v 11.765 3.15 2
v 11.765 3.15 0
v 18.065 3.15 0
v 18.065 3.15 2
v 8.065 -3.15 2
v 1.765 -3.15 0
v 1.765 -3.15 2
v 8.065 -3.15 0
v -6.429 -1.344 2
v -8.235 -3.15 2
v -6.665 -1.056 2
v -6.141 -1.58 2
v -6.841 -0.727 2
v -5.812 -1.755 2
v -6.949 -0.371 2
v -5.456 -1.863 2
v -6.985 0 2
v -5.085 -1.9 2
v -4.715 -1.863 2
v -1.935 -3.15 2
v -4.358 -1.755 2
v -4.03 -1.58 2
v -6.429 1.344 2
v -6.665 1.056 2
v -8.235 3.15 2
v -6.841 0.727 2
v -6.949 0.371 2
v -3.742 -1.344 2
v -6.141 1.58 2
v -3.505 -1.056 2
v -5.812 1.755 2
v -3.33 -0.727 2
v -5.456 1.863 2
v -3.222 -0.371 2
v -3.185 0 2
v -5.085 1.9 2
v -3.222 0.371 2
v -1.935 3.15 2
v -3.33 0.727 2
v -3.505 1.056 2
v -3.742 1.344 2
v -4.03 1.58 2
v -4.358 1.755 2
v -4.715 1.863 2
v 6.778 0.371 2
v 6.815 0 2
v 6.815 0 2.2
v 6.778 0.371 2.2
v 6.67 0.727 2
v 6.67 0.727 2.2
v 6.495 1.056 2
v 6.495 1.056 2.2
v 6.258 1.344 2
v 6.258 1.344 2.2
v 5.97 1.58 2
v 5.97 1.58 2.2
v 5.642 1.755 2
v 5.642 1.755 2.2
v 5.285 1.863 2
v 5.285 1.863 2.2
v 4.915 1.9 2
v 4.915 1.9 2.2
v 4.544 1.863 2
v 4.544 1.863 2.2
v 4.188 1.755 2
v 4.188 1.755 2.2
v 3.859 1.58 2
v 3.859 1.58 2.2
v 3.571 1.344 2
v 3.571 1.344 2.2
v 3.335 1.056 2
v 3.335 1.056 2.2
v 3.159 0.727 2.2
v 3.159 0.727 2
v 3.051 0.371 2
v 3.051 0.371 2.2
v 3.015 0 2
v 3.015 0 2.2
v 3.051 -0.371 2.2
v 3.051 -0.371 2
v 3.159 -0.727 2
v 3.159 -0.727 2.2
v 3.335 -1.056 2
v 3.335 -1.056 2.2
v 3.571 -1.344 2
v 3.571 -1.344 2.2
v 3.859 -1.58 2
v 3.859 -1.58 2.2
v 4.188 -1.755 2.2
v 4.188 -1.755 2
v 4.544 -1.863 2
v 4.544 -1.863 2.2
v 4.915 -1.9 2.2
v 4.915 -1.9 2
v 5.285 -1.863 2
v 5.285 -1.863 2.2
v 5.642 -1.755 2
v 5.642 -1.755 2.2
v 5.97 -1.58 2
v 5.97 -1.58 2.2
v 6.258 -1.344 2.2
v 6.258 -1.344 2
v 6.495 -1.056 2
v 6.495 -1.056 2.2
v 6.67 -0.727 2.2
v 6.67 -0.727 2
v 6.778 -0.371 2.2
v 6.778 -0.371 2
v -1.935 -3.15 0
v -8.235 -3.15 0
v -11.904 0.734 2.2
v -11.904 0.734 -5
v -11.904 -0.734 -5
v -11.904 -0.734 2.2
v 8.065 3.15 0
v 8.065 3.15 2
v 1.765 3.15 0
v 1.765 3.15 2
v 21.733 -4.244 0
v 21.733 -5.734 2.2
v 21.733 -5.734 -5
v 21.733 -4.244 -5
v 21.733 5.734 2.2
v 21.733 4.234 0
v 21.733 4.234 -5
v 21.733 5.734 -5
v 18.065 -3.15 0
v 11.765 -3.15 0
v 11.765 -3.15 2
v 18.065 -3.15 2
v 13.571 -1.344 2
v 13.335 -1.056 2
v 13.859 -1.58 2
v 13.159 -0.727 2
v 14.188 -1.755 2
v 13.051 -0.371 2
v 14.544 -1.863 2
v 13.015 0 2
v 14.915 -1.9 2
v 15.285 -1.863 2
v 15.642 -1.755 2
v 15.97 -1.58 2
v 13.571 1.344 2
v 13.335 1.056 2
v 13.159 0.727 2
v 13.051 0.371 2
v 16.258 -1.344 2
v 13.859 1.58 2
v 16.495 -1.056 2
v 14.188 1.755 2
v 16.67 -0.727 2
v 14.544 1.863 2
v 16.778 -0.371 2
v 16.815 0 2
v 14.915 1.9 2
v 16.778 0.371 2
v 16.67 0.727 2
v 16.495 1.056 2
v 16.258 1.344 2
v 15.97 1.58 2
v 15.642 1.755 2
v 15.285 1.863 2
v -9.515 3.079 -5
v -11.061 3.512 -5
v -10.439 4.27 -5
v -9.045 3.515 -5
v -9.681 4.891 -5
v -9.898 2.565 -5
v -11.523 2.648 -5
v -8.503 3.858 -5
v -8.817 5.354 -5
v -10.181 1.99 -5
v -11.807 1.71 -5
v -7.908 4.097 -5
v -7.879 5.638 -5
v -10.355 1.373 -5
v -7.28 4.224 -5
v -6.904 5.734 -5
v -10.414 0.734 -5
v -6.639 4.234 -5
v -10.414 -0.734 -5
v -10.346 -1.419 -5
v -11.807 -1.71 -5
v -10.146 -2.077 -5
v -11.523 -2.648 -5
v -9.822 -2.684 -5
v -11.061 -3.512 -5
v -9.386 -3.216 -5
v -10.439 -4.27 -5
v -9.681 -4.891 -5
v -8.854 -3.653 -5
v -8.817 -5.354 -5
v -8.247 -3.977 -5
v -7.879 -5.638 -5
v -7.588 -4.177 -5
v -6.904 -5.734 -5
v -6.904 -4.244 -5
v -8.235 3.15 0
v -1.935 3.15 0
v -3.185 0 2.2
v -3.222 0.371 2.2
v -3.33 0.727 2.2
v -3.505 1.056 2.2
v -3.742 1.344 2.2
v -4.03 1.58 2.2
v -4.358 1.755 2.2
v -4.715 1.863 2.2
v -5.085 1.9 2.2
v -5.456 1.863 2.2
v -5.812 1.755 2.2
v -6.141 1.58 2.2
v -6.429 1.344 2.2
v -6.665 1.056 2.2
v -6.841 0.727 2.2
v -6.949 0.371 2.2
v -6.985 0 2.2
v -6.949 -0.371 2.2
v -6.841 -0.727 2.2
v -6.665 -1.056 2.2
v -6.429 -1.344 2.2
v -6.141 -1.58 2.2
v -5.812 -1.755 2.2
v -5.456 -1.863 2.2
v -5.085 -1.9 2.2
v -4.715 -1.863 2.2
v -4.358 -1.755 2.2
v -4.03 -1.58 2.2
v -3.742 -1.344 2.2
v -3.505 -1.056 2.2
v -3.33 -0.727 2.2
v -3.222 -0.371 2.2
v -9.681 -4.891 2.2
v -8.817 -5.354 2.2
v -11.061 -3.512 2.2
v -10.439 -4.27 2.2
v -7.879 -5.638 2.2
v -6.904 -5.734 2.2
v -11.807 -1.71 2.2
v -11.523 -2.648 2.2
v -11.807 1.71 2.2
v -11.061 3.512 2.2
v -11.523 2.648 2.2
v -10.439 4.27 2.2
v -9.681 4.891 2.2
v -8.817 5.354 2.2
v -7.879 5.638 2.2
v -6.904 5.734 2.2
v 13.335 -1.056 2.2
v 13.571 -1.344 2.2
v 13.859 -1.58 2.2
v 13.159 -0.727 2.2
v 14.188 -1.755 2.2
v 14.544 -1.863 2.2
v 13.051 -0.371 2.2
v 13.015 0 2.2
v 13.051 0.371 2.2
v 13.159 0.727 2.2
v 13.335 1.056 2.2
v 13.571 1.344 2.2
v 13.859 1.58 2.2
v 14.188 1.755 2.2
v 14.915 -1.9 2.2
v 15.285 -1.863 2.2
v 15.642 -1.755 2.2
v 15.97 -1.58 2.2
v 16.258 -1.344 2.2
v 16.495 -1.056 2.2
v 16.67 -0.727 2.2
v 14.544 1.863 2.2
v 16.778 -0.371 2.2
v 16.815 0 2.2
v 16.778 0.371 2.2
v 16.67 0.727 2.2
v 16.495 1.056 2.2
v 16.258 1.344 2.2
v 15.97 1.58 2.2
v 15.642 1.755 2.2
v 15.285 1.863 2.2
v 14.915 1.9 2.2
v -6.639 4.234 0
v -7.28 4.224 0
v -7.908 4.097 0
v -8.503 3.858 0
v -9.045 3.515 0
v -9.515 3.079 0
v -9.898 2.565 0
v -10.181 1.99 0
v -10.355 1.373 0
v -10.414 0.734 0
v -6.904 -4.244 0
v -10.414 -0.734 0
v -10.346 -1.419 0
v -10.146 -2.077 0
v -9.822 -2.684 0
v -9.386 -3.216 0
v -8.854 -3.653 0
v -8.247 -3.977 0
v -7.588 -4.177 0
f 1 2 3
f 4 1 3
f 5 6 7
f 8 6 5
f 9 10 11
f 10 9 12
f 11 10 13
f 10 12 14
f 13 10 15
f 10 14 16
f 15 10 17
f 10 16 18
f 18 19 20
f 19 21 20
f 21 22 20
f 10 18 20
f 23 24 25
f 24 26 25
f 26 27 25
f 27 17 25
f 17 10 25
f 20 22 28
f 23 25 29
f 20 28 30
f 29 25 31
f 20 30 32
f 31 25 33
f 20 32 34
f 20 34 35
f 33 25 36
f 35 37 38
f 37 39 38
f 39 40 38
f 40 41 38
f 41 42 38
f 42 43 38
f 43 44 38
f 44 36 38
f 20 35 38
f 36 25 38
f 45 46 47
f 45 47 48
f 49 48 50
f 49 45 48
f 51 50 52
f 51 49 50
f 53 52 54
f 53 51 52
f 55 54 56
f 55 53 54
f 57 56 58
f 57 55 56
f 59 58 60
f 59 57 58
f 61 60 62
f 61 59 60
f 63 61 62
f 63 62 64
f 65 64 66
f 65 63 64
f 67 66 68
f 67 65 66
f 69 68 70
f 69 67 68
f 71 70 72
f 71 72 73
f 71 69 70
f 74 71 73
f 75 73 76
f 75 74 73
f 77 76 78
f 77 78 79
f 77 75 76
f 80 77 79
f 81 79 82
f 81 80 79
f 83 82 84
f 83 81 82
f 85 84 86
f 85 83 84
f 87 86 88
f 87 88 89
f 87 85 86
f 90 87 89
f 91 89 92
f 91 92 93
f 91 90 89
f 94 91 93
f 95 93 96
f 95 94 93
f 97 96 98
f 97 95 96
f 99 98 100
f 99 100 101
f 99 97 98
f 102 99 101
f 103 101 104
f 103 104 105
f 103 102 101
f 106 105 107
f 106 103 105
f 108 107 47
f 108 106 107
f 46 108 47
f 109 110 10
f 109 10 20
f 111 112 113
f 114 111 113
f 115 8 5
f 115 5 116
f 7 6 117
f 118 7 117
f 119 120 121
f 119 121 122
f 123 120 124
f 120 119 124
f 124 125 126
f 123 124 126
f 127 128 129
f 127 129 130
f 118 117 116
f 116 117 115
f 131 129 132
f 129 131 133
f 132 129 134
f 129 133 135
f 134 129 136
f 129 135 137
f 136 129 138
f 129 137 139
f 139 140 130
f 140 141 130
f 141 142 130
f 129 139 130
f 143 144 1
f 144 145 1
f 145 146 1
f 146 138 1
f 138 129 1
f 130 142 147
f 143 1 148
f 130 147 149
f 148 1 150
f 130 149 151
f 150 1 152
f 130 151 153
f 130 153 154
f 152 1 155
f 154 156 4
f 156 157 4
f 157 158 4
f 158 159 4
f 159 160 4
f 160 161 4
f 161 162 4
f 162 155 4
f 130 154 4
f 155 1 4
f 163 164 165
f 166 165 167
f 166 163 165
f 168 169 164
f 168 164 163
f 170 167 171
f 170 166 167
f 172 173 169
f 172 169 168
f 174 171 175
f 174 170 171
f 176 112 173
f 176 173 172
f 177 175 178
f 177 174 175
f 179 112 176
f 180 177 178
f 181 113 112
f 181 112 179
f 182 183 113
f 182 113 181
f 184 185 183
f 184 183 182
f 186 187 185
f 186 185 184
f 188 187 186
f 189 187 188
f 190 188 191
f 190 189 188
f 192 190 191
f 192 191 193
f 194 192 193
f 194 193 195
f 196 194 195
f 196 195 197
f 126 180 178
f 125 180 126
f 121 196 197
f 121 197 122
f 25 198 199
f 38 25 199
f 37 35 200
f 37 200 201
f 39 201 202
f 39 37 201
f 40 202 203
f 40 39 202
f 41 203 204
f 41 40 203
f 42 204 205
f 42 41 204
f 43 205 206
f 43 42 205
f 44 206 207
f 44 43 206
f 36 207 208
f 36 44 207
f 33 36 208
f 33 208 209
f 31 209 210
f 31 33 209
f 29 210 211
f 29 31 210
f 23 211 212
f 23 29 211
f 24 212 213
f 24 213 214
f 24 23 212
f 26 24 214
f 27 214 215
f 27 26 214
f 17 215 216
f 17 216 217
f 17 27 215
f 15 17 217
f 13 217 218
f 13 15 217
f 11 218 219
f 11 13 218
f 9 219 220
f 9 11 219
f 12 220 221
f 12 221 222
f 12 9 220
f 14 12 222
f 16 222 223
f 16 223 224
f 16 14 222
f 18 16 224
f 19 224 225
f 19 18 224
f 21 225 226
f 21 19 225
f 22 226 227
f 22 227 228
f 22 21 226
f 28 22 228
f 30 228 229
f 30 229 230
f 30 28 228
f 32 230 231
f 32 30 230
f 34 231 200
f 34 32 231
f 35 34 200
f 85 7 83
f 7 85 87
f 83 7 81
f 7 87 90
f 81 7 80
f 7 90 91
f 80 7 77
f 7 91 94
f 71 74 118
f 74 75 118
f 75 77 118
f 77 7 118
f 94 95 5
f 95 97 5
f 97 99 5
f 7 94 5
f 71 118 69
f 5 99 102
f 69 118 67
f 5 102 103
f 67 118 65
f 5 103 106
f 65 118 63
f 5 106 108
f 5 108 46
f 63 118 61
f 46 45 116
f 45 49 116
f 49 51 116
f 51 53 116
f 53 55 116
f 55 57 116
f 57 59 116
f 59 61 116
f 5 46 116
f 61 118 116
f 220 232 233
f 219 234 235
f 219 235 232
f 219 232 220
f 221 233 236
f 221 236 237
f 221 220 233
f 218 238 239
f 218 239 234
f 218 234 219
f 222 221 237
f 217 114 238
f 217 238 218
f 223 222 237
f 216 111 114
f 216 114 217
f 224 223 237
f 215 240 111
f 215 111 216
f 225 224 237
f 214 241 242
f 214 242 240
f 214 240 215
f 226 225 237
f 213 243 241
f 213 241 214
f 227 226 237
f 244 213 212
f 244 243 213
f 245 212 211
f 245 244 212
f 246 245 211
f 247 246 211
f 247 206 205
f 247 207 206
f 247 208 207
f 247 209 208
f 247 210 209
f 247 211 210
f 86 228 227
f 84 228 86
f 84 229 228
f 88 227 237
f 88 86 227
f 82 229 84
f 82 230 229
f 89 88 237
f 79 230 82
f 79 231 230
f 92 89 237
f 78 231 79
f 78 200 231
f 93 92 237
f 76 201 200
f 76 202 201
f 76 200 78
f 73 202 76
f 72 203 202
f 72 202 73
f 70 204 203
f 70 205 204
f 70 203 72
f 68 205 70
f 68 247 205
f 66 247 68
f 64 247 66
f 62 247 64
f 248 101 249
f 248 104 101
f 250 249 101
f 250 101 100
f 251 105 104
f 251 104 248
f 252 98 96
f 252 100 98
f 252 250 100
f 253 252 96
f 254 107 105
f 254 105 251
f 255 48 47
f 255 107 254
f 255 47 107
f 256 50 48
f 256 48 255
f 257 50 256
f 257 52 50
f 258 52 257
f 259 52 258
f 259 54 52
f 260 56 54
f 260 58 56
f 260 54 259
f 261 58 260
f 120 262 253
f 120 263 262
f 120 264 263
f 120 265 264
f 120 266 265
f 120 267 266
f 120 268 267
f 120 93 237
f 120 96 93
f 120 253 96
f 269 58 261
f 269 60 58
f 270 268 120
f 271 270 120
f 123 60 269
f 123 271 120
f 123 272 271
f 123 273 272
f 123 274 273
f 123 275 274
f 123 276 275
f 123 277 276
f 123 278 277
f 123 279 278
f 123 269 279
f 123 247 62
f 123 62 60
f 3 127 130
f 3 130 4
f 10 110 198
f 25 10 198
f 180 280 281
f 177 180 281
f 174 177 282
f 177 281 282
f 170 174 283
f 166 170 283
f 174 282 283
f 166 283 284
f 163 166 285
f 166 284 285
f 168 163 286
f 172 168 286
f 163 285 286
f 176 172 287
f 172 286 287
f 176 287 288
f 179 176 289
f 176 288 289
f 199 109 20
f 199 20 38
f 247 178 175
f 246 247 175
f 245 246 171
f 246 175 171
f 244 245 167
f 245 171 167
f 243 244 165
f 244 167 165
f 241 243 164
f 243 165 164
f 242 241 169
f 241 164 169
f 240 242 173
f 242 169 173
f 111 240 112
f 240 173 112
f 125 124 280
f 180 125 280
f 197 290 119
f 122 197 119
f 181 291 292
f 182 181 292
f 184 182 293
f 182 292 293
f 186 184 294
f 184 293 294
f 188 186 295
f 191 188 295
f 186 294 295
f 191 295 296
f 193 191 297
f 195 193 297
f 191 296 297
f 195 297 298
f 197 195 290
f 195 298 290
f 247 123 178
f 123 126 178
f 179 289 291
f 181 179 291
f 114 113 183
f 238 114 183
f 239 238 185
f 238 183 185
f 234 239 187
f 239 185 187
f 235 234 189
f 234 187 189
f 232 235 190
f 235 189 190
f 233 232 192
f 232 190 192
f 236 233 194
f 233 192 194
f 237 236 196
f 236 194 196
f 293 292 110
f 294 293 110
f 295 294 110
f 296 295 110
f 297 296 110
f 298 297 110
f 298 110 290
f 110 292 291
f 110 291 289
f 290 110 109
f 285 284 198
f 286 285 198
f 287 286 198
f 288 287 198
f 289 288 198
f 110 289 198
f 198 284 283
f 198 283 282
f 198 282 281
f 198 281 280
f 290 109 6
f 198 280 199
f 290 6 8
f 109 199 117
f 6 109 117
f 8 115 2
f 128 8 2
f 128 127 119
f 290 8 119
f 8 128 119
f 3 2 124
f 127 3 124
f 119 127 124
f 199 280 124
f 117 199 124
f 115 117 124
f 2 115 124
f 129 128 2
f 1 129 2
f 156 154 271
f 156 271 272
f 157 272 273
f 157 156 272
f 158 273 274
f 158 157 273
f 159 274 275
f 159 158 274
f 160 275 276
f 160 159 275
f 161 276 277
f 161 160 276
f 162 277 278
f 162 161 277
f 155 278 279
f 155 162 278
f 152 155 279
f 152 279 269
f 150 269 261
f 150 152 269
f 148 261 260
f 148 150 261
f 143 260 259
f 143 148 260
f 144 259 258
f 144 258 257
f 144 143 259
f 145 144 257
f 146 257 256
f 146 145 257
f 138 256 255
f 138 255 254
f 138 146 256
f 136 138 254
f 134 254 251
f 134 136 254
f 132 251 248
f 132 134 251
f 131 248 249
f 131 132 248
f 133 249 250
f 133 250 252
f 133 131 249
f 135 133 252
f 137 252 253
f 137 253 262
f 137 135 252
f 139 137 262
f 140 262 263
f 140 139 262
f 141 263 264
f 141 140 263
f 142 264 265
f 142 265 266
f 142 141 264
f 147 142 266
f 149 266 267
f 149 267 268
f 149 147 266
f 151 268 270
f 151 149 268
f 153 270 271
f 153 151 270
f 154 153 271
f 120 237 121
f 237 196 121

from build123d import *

# Parameters (mm, degrees)
F0_W     = 6.3
F0_H     = 6.3
F1_DEPTH = 2
F3_DEPTH = 5
F4_R     = 1.9
F5_DEPTH = 0.2


with BuildPart() as f1:
    # F0 (on Top) → F1 (new body)
    with BuildSketch(Plane.XY):
        with BuildLine():
            Line((21.733175, 5.734117), (-6.903563, 5.734117))
            ThreePointArc((-6.903563, 5.734117), (-10.439097, 4.269651), (-11.903563, 0.734117))
            Line((-11.903563, 0.734117), (-11.903563, -0.734117))
            ThreePointArc((-11.903563, -0.734117), (-10.439097, -4.269651), (-6.903563, -5.734117))
            Line((-6.903563, -5.734117), (21.733175, -5.734117))
            Line((21.733175, -5.734117), (21.733175, 5.734117))
        make_face()
        with Locations((-5.085194, 0)):
            Rectangle(F0_W, F0_H, mode=Mode.SUBTRACT)
        with Locations((4.914806, 0)):
            Rectangle(F0_W, F0_H, mode=Mode.SUBTRACT)
        with Locations((14.914806, 0)):
            Rectangle(F0_W, F0_H, mode=Mode.SUBTRACT)
    extrude(amount=F1_DEPTH)

    # F2 (on face) → F3 (join)
    with BuildSketch(Plane(origin=(0, 0, 0), x_dir=(1, 0, 0), z_dir=(0, 0, -1))):
        with BuildLine():
            Line((21.733175, 5.734117), (-6.903563, 5.734117))
            ThreePointArc((-6.903563, 5.734117), (-10.439097, 4.269651), (-11.903563, 0.734117))
            Line((-11.903563, 0.734117), (-11.903563, -0.734117))
            ThreePointArc((-11.903563, -0.734117), (-10.439097, -4.269651), (-6.903563, -5.734117))
            Line((-6.903563, -5.734117), (21.733175, -5.734117))
            Line((21.733175, -5.734117), (21.733175, -4.234117))
            Line((21.733175, -4.234117), (-5.403563, -4.234117))
            Line((-5.403563, -4.234117), (-6.638798, -4.234117))
            ThreePointArc((-6.638798, -4.234117), (-9.290064, -3.307969), (-10.413563, -0.734117))
            Line((-10.413563, -0.734117), (-10.413563, 0.734117))
            ThreePointArc((-10.413563, 0.734117), (-9.385508, 3.216062), (-6.903563, 4.244117))
            Line((-6.903563, 4.244117), (-5.403563, 4.244117))
            Line((-5.403563, 4.244117), (21.733175, 4.244117))
            Line((21.733175, 4.244117), (21.733175, 5.734117))
        make_face()
    extrude(amount=F3_DEPTH)

    # F4 (on face) → F5 (join)
    with BuildSketch(Plane.XY.offset(2)):
        with BuildLine():
            ThreePointArc((-11.903563, -0.734117), (-10.439097, -4.269651), (-6.903563, -5.734117))
            Line((-6.903563, -5.734117), (21.733175, -5.734117))
            Line((21.733175, -5.734117), (21.733175, 5.734117))
            Line((21.733175, 5.734117), (-6.903563, 5.734117))
            ThreePointArc((-6.903563, 5.734117), (-10.439097, 4.269651), (-11.903563, 0.734117))
            Line((-11.903563, 0.734117), (-11.903563, -0.734117))
        make_face()
        with Locations((-5.085194, 0)):
            Circle(F4_R, mode=Mode.SUBTRACT)
        with Locations((4.914806, 0)):
            Circle(F4_R, mode=Mode.SUBTRACT)
        with Locations((14.914806, 0)):
            Circle(F4_R, mode=Mode.SUBTRACT)
    extrude(amount=F5_DEPTH)


solid = f1.part
